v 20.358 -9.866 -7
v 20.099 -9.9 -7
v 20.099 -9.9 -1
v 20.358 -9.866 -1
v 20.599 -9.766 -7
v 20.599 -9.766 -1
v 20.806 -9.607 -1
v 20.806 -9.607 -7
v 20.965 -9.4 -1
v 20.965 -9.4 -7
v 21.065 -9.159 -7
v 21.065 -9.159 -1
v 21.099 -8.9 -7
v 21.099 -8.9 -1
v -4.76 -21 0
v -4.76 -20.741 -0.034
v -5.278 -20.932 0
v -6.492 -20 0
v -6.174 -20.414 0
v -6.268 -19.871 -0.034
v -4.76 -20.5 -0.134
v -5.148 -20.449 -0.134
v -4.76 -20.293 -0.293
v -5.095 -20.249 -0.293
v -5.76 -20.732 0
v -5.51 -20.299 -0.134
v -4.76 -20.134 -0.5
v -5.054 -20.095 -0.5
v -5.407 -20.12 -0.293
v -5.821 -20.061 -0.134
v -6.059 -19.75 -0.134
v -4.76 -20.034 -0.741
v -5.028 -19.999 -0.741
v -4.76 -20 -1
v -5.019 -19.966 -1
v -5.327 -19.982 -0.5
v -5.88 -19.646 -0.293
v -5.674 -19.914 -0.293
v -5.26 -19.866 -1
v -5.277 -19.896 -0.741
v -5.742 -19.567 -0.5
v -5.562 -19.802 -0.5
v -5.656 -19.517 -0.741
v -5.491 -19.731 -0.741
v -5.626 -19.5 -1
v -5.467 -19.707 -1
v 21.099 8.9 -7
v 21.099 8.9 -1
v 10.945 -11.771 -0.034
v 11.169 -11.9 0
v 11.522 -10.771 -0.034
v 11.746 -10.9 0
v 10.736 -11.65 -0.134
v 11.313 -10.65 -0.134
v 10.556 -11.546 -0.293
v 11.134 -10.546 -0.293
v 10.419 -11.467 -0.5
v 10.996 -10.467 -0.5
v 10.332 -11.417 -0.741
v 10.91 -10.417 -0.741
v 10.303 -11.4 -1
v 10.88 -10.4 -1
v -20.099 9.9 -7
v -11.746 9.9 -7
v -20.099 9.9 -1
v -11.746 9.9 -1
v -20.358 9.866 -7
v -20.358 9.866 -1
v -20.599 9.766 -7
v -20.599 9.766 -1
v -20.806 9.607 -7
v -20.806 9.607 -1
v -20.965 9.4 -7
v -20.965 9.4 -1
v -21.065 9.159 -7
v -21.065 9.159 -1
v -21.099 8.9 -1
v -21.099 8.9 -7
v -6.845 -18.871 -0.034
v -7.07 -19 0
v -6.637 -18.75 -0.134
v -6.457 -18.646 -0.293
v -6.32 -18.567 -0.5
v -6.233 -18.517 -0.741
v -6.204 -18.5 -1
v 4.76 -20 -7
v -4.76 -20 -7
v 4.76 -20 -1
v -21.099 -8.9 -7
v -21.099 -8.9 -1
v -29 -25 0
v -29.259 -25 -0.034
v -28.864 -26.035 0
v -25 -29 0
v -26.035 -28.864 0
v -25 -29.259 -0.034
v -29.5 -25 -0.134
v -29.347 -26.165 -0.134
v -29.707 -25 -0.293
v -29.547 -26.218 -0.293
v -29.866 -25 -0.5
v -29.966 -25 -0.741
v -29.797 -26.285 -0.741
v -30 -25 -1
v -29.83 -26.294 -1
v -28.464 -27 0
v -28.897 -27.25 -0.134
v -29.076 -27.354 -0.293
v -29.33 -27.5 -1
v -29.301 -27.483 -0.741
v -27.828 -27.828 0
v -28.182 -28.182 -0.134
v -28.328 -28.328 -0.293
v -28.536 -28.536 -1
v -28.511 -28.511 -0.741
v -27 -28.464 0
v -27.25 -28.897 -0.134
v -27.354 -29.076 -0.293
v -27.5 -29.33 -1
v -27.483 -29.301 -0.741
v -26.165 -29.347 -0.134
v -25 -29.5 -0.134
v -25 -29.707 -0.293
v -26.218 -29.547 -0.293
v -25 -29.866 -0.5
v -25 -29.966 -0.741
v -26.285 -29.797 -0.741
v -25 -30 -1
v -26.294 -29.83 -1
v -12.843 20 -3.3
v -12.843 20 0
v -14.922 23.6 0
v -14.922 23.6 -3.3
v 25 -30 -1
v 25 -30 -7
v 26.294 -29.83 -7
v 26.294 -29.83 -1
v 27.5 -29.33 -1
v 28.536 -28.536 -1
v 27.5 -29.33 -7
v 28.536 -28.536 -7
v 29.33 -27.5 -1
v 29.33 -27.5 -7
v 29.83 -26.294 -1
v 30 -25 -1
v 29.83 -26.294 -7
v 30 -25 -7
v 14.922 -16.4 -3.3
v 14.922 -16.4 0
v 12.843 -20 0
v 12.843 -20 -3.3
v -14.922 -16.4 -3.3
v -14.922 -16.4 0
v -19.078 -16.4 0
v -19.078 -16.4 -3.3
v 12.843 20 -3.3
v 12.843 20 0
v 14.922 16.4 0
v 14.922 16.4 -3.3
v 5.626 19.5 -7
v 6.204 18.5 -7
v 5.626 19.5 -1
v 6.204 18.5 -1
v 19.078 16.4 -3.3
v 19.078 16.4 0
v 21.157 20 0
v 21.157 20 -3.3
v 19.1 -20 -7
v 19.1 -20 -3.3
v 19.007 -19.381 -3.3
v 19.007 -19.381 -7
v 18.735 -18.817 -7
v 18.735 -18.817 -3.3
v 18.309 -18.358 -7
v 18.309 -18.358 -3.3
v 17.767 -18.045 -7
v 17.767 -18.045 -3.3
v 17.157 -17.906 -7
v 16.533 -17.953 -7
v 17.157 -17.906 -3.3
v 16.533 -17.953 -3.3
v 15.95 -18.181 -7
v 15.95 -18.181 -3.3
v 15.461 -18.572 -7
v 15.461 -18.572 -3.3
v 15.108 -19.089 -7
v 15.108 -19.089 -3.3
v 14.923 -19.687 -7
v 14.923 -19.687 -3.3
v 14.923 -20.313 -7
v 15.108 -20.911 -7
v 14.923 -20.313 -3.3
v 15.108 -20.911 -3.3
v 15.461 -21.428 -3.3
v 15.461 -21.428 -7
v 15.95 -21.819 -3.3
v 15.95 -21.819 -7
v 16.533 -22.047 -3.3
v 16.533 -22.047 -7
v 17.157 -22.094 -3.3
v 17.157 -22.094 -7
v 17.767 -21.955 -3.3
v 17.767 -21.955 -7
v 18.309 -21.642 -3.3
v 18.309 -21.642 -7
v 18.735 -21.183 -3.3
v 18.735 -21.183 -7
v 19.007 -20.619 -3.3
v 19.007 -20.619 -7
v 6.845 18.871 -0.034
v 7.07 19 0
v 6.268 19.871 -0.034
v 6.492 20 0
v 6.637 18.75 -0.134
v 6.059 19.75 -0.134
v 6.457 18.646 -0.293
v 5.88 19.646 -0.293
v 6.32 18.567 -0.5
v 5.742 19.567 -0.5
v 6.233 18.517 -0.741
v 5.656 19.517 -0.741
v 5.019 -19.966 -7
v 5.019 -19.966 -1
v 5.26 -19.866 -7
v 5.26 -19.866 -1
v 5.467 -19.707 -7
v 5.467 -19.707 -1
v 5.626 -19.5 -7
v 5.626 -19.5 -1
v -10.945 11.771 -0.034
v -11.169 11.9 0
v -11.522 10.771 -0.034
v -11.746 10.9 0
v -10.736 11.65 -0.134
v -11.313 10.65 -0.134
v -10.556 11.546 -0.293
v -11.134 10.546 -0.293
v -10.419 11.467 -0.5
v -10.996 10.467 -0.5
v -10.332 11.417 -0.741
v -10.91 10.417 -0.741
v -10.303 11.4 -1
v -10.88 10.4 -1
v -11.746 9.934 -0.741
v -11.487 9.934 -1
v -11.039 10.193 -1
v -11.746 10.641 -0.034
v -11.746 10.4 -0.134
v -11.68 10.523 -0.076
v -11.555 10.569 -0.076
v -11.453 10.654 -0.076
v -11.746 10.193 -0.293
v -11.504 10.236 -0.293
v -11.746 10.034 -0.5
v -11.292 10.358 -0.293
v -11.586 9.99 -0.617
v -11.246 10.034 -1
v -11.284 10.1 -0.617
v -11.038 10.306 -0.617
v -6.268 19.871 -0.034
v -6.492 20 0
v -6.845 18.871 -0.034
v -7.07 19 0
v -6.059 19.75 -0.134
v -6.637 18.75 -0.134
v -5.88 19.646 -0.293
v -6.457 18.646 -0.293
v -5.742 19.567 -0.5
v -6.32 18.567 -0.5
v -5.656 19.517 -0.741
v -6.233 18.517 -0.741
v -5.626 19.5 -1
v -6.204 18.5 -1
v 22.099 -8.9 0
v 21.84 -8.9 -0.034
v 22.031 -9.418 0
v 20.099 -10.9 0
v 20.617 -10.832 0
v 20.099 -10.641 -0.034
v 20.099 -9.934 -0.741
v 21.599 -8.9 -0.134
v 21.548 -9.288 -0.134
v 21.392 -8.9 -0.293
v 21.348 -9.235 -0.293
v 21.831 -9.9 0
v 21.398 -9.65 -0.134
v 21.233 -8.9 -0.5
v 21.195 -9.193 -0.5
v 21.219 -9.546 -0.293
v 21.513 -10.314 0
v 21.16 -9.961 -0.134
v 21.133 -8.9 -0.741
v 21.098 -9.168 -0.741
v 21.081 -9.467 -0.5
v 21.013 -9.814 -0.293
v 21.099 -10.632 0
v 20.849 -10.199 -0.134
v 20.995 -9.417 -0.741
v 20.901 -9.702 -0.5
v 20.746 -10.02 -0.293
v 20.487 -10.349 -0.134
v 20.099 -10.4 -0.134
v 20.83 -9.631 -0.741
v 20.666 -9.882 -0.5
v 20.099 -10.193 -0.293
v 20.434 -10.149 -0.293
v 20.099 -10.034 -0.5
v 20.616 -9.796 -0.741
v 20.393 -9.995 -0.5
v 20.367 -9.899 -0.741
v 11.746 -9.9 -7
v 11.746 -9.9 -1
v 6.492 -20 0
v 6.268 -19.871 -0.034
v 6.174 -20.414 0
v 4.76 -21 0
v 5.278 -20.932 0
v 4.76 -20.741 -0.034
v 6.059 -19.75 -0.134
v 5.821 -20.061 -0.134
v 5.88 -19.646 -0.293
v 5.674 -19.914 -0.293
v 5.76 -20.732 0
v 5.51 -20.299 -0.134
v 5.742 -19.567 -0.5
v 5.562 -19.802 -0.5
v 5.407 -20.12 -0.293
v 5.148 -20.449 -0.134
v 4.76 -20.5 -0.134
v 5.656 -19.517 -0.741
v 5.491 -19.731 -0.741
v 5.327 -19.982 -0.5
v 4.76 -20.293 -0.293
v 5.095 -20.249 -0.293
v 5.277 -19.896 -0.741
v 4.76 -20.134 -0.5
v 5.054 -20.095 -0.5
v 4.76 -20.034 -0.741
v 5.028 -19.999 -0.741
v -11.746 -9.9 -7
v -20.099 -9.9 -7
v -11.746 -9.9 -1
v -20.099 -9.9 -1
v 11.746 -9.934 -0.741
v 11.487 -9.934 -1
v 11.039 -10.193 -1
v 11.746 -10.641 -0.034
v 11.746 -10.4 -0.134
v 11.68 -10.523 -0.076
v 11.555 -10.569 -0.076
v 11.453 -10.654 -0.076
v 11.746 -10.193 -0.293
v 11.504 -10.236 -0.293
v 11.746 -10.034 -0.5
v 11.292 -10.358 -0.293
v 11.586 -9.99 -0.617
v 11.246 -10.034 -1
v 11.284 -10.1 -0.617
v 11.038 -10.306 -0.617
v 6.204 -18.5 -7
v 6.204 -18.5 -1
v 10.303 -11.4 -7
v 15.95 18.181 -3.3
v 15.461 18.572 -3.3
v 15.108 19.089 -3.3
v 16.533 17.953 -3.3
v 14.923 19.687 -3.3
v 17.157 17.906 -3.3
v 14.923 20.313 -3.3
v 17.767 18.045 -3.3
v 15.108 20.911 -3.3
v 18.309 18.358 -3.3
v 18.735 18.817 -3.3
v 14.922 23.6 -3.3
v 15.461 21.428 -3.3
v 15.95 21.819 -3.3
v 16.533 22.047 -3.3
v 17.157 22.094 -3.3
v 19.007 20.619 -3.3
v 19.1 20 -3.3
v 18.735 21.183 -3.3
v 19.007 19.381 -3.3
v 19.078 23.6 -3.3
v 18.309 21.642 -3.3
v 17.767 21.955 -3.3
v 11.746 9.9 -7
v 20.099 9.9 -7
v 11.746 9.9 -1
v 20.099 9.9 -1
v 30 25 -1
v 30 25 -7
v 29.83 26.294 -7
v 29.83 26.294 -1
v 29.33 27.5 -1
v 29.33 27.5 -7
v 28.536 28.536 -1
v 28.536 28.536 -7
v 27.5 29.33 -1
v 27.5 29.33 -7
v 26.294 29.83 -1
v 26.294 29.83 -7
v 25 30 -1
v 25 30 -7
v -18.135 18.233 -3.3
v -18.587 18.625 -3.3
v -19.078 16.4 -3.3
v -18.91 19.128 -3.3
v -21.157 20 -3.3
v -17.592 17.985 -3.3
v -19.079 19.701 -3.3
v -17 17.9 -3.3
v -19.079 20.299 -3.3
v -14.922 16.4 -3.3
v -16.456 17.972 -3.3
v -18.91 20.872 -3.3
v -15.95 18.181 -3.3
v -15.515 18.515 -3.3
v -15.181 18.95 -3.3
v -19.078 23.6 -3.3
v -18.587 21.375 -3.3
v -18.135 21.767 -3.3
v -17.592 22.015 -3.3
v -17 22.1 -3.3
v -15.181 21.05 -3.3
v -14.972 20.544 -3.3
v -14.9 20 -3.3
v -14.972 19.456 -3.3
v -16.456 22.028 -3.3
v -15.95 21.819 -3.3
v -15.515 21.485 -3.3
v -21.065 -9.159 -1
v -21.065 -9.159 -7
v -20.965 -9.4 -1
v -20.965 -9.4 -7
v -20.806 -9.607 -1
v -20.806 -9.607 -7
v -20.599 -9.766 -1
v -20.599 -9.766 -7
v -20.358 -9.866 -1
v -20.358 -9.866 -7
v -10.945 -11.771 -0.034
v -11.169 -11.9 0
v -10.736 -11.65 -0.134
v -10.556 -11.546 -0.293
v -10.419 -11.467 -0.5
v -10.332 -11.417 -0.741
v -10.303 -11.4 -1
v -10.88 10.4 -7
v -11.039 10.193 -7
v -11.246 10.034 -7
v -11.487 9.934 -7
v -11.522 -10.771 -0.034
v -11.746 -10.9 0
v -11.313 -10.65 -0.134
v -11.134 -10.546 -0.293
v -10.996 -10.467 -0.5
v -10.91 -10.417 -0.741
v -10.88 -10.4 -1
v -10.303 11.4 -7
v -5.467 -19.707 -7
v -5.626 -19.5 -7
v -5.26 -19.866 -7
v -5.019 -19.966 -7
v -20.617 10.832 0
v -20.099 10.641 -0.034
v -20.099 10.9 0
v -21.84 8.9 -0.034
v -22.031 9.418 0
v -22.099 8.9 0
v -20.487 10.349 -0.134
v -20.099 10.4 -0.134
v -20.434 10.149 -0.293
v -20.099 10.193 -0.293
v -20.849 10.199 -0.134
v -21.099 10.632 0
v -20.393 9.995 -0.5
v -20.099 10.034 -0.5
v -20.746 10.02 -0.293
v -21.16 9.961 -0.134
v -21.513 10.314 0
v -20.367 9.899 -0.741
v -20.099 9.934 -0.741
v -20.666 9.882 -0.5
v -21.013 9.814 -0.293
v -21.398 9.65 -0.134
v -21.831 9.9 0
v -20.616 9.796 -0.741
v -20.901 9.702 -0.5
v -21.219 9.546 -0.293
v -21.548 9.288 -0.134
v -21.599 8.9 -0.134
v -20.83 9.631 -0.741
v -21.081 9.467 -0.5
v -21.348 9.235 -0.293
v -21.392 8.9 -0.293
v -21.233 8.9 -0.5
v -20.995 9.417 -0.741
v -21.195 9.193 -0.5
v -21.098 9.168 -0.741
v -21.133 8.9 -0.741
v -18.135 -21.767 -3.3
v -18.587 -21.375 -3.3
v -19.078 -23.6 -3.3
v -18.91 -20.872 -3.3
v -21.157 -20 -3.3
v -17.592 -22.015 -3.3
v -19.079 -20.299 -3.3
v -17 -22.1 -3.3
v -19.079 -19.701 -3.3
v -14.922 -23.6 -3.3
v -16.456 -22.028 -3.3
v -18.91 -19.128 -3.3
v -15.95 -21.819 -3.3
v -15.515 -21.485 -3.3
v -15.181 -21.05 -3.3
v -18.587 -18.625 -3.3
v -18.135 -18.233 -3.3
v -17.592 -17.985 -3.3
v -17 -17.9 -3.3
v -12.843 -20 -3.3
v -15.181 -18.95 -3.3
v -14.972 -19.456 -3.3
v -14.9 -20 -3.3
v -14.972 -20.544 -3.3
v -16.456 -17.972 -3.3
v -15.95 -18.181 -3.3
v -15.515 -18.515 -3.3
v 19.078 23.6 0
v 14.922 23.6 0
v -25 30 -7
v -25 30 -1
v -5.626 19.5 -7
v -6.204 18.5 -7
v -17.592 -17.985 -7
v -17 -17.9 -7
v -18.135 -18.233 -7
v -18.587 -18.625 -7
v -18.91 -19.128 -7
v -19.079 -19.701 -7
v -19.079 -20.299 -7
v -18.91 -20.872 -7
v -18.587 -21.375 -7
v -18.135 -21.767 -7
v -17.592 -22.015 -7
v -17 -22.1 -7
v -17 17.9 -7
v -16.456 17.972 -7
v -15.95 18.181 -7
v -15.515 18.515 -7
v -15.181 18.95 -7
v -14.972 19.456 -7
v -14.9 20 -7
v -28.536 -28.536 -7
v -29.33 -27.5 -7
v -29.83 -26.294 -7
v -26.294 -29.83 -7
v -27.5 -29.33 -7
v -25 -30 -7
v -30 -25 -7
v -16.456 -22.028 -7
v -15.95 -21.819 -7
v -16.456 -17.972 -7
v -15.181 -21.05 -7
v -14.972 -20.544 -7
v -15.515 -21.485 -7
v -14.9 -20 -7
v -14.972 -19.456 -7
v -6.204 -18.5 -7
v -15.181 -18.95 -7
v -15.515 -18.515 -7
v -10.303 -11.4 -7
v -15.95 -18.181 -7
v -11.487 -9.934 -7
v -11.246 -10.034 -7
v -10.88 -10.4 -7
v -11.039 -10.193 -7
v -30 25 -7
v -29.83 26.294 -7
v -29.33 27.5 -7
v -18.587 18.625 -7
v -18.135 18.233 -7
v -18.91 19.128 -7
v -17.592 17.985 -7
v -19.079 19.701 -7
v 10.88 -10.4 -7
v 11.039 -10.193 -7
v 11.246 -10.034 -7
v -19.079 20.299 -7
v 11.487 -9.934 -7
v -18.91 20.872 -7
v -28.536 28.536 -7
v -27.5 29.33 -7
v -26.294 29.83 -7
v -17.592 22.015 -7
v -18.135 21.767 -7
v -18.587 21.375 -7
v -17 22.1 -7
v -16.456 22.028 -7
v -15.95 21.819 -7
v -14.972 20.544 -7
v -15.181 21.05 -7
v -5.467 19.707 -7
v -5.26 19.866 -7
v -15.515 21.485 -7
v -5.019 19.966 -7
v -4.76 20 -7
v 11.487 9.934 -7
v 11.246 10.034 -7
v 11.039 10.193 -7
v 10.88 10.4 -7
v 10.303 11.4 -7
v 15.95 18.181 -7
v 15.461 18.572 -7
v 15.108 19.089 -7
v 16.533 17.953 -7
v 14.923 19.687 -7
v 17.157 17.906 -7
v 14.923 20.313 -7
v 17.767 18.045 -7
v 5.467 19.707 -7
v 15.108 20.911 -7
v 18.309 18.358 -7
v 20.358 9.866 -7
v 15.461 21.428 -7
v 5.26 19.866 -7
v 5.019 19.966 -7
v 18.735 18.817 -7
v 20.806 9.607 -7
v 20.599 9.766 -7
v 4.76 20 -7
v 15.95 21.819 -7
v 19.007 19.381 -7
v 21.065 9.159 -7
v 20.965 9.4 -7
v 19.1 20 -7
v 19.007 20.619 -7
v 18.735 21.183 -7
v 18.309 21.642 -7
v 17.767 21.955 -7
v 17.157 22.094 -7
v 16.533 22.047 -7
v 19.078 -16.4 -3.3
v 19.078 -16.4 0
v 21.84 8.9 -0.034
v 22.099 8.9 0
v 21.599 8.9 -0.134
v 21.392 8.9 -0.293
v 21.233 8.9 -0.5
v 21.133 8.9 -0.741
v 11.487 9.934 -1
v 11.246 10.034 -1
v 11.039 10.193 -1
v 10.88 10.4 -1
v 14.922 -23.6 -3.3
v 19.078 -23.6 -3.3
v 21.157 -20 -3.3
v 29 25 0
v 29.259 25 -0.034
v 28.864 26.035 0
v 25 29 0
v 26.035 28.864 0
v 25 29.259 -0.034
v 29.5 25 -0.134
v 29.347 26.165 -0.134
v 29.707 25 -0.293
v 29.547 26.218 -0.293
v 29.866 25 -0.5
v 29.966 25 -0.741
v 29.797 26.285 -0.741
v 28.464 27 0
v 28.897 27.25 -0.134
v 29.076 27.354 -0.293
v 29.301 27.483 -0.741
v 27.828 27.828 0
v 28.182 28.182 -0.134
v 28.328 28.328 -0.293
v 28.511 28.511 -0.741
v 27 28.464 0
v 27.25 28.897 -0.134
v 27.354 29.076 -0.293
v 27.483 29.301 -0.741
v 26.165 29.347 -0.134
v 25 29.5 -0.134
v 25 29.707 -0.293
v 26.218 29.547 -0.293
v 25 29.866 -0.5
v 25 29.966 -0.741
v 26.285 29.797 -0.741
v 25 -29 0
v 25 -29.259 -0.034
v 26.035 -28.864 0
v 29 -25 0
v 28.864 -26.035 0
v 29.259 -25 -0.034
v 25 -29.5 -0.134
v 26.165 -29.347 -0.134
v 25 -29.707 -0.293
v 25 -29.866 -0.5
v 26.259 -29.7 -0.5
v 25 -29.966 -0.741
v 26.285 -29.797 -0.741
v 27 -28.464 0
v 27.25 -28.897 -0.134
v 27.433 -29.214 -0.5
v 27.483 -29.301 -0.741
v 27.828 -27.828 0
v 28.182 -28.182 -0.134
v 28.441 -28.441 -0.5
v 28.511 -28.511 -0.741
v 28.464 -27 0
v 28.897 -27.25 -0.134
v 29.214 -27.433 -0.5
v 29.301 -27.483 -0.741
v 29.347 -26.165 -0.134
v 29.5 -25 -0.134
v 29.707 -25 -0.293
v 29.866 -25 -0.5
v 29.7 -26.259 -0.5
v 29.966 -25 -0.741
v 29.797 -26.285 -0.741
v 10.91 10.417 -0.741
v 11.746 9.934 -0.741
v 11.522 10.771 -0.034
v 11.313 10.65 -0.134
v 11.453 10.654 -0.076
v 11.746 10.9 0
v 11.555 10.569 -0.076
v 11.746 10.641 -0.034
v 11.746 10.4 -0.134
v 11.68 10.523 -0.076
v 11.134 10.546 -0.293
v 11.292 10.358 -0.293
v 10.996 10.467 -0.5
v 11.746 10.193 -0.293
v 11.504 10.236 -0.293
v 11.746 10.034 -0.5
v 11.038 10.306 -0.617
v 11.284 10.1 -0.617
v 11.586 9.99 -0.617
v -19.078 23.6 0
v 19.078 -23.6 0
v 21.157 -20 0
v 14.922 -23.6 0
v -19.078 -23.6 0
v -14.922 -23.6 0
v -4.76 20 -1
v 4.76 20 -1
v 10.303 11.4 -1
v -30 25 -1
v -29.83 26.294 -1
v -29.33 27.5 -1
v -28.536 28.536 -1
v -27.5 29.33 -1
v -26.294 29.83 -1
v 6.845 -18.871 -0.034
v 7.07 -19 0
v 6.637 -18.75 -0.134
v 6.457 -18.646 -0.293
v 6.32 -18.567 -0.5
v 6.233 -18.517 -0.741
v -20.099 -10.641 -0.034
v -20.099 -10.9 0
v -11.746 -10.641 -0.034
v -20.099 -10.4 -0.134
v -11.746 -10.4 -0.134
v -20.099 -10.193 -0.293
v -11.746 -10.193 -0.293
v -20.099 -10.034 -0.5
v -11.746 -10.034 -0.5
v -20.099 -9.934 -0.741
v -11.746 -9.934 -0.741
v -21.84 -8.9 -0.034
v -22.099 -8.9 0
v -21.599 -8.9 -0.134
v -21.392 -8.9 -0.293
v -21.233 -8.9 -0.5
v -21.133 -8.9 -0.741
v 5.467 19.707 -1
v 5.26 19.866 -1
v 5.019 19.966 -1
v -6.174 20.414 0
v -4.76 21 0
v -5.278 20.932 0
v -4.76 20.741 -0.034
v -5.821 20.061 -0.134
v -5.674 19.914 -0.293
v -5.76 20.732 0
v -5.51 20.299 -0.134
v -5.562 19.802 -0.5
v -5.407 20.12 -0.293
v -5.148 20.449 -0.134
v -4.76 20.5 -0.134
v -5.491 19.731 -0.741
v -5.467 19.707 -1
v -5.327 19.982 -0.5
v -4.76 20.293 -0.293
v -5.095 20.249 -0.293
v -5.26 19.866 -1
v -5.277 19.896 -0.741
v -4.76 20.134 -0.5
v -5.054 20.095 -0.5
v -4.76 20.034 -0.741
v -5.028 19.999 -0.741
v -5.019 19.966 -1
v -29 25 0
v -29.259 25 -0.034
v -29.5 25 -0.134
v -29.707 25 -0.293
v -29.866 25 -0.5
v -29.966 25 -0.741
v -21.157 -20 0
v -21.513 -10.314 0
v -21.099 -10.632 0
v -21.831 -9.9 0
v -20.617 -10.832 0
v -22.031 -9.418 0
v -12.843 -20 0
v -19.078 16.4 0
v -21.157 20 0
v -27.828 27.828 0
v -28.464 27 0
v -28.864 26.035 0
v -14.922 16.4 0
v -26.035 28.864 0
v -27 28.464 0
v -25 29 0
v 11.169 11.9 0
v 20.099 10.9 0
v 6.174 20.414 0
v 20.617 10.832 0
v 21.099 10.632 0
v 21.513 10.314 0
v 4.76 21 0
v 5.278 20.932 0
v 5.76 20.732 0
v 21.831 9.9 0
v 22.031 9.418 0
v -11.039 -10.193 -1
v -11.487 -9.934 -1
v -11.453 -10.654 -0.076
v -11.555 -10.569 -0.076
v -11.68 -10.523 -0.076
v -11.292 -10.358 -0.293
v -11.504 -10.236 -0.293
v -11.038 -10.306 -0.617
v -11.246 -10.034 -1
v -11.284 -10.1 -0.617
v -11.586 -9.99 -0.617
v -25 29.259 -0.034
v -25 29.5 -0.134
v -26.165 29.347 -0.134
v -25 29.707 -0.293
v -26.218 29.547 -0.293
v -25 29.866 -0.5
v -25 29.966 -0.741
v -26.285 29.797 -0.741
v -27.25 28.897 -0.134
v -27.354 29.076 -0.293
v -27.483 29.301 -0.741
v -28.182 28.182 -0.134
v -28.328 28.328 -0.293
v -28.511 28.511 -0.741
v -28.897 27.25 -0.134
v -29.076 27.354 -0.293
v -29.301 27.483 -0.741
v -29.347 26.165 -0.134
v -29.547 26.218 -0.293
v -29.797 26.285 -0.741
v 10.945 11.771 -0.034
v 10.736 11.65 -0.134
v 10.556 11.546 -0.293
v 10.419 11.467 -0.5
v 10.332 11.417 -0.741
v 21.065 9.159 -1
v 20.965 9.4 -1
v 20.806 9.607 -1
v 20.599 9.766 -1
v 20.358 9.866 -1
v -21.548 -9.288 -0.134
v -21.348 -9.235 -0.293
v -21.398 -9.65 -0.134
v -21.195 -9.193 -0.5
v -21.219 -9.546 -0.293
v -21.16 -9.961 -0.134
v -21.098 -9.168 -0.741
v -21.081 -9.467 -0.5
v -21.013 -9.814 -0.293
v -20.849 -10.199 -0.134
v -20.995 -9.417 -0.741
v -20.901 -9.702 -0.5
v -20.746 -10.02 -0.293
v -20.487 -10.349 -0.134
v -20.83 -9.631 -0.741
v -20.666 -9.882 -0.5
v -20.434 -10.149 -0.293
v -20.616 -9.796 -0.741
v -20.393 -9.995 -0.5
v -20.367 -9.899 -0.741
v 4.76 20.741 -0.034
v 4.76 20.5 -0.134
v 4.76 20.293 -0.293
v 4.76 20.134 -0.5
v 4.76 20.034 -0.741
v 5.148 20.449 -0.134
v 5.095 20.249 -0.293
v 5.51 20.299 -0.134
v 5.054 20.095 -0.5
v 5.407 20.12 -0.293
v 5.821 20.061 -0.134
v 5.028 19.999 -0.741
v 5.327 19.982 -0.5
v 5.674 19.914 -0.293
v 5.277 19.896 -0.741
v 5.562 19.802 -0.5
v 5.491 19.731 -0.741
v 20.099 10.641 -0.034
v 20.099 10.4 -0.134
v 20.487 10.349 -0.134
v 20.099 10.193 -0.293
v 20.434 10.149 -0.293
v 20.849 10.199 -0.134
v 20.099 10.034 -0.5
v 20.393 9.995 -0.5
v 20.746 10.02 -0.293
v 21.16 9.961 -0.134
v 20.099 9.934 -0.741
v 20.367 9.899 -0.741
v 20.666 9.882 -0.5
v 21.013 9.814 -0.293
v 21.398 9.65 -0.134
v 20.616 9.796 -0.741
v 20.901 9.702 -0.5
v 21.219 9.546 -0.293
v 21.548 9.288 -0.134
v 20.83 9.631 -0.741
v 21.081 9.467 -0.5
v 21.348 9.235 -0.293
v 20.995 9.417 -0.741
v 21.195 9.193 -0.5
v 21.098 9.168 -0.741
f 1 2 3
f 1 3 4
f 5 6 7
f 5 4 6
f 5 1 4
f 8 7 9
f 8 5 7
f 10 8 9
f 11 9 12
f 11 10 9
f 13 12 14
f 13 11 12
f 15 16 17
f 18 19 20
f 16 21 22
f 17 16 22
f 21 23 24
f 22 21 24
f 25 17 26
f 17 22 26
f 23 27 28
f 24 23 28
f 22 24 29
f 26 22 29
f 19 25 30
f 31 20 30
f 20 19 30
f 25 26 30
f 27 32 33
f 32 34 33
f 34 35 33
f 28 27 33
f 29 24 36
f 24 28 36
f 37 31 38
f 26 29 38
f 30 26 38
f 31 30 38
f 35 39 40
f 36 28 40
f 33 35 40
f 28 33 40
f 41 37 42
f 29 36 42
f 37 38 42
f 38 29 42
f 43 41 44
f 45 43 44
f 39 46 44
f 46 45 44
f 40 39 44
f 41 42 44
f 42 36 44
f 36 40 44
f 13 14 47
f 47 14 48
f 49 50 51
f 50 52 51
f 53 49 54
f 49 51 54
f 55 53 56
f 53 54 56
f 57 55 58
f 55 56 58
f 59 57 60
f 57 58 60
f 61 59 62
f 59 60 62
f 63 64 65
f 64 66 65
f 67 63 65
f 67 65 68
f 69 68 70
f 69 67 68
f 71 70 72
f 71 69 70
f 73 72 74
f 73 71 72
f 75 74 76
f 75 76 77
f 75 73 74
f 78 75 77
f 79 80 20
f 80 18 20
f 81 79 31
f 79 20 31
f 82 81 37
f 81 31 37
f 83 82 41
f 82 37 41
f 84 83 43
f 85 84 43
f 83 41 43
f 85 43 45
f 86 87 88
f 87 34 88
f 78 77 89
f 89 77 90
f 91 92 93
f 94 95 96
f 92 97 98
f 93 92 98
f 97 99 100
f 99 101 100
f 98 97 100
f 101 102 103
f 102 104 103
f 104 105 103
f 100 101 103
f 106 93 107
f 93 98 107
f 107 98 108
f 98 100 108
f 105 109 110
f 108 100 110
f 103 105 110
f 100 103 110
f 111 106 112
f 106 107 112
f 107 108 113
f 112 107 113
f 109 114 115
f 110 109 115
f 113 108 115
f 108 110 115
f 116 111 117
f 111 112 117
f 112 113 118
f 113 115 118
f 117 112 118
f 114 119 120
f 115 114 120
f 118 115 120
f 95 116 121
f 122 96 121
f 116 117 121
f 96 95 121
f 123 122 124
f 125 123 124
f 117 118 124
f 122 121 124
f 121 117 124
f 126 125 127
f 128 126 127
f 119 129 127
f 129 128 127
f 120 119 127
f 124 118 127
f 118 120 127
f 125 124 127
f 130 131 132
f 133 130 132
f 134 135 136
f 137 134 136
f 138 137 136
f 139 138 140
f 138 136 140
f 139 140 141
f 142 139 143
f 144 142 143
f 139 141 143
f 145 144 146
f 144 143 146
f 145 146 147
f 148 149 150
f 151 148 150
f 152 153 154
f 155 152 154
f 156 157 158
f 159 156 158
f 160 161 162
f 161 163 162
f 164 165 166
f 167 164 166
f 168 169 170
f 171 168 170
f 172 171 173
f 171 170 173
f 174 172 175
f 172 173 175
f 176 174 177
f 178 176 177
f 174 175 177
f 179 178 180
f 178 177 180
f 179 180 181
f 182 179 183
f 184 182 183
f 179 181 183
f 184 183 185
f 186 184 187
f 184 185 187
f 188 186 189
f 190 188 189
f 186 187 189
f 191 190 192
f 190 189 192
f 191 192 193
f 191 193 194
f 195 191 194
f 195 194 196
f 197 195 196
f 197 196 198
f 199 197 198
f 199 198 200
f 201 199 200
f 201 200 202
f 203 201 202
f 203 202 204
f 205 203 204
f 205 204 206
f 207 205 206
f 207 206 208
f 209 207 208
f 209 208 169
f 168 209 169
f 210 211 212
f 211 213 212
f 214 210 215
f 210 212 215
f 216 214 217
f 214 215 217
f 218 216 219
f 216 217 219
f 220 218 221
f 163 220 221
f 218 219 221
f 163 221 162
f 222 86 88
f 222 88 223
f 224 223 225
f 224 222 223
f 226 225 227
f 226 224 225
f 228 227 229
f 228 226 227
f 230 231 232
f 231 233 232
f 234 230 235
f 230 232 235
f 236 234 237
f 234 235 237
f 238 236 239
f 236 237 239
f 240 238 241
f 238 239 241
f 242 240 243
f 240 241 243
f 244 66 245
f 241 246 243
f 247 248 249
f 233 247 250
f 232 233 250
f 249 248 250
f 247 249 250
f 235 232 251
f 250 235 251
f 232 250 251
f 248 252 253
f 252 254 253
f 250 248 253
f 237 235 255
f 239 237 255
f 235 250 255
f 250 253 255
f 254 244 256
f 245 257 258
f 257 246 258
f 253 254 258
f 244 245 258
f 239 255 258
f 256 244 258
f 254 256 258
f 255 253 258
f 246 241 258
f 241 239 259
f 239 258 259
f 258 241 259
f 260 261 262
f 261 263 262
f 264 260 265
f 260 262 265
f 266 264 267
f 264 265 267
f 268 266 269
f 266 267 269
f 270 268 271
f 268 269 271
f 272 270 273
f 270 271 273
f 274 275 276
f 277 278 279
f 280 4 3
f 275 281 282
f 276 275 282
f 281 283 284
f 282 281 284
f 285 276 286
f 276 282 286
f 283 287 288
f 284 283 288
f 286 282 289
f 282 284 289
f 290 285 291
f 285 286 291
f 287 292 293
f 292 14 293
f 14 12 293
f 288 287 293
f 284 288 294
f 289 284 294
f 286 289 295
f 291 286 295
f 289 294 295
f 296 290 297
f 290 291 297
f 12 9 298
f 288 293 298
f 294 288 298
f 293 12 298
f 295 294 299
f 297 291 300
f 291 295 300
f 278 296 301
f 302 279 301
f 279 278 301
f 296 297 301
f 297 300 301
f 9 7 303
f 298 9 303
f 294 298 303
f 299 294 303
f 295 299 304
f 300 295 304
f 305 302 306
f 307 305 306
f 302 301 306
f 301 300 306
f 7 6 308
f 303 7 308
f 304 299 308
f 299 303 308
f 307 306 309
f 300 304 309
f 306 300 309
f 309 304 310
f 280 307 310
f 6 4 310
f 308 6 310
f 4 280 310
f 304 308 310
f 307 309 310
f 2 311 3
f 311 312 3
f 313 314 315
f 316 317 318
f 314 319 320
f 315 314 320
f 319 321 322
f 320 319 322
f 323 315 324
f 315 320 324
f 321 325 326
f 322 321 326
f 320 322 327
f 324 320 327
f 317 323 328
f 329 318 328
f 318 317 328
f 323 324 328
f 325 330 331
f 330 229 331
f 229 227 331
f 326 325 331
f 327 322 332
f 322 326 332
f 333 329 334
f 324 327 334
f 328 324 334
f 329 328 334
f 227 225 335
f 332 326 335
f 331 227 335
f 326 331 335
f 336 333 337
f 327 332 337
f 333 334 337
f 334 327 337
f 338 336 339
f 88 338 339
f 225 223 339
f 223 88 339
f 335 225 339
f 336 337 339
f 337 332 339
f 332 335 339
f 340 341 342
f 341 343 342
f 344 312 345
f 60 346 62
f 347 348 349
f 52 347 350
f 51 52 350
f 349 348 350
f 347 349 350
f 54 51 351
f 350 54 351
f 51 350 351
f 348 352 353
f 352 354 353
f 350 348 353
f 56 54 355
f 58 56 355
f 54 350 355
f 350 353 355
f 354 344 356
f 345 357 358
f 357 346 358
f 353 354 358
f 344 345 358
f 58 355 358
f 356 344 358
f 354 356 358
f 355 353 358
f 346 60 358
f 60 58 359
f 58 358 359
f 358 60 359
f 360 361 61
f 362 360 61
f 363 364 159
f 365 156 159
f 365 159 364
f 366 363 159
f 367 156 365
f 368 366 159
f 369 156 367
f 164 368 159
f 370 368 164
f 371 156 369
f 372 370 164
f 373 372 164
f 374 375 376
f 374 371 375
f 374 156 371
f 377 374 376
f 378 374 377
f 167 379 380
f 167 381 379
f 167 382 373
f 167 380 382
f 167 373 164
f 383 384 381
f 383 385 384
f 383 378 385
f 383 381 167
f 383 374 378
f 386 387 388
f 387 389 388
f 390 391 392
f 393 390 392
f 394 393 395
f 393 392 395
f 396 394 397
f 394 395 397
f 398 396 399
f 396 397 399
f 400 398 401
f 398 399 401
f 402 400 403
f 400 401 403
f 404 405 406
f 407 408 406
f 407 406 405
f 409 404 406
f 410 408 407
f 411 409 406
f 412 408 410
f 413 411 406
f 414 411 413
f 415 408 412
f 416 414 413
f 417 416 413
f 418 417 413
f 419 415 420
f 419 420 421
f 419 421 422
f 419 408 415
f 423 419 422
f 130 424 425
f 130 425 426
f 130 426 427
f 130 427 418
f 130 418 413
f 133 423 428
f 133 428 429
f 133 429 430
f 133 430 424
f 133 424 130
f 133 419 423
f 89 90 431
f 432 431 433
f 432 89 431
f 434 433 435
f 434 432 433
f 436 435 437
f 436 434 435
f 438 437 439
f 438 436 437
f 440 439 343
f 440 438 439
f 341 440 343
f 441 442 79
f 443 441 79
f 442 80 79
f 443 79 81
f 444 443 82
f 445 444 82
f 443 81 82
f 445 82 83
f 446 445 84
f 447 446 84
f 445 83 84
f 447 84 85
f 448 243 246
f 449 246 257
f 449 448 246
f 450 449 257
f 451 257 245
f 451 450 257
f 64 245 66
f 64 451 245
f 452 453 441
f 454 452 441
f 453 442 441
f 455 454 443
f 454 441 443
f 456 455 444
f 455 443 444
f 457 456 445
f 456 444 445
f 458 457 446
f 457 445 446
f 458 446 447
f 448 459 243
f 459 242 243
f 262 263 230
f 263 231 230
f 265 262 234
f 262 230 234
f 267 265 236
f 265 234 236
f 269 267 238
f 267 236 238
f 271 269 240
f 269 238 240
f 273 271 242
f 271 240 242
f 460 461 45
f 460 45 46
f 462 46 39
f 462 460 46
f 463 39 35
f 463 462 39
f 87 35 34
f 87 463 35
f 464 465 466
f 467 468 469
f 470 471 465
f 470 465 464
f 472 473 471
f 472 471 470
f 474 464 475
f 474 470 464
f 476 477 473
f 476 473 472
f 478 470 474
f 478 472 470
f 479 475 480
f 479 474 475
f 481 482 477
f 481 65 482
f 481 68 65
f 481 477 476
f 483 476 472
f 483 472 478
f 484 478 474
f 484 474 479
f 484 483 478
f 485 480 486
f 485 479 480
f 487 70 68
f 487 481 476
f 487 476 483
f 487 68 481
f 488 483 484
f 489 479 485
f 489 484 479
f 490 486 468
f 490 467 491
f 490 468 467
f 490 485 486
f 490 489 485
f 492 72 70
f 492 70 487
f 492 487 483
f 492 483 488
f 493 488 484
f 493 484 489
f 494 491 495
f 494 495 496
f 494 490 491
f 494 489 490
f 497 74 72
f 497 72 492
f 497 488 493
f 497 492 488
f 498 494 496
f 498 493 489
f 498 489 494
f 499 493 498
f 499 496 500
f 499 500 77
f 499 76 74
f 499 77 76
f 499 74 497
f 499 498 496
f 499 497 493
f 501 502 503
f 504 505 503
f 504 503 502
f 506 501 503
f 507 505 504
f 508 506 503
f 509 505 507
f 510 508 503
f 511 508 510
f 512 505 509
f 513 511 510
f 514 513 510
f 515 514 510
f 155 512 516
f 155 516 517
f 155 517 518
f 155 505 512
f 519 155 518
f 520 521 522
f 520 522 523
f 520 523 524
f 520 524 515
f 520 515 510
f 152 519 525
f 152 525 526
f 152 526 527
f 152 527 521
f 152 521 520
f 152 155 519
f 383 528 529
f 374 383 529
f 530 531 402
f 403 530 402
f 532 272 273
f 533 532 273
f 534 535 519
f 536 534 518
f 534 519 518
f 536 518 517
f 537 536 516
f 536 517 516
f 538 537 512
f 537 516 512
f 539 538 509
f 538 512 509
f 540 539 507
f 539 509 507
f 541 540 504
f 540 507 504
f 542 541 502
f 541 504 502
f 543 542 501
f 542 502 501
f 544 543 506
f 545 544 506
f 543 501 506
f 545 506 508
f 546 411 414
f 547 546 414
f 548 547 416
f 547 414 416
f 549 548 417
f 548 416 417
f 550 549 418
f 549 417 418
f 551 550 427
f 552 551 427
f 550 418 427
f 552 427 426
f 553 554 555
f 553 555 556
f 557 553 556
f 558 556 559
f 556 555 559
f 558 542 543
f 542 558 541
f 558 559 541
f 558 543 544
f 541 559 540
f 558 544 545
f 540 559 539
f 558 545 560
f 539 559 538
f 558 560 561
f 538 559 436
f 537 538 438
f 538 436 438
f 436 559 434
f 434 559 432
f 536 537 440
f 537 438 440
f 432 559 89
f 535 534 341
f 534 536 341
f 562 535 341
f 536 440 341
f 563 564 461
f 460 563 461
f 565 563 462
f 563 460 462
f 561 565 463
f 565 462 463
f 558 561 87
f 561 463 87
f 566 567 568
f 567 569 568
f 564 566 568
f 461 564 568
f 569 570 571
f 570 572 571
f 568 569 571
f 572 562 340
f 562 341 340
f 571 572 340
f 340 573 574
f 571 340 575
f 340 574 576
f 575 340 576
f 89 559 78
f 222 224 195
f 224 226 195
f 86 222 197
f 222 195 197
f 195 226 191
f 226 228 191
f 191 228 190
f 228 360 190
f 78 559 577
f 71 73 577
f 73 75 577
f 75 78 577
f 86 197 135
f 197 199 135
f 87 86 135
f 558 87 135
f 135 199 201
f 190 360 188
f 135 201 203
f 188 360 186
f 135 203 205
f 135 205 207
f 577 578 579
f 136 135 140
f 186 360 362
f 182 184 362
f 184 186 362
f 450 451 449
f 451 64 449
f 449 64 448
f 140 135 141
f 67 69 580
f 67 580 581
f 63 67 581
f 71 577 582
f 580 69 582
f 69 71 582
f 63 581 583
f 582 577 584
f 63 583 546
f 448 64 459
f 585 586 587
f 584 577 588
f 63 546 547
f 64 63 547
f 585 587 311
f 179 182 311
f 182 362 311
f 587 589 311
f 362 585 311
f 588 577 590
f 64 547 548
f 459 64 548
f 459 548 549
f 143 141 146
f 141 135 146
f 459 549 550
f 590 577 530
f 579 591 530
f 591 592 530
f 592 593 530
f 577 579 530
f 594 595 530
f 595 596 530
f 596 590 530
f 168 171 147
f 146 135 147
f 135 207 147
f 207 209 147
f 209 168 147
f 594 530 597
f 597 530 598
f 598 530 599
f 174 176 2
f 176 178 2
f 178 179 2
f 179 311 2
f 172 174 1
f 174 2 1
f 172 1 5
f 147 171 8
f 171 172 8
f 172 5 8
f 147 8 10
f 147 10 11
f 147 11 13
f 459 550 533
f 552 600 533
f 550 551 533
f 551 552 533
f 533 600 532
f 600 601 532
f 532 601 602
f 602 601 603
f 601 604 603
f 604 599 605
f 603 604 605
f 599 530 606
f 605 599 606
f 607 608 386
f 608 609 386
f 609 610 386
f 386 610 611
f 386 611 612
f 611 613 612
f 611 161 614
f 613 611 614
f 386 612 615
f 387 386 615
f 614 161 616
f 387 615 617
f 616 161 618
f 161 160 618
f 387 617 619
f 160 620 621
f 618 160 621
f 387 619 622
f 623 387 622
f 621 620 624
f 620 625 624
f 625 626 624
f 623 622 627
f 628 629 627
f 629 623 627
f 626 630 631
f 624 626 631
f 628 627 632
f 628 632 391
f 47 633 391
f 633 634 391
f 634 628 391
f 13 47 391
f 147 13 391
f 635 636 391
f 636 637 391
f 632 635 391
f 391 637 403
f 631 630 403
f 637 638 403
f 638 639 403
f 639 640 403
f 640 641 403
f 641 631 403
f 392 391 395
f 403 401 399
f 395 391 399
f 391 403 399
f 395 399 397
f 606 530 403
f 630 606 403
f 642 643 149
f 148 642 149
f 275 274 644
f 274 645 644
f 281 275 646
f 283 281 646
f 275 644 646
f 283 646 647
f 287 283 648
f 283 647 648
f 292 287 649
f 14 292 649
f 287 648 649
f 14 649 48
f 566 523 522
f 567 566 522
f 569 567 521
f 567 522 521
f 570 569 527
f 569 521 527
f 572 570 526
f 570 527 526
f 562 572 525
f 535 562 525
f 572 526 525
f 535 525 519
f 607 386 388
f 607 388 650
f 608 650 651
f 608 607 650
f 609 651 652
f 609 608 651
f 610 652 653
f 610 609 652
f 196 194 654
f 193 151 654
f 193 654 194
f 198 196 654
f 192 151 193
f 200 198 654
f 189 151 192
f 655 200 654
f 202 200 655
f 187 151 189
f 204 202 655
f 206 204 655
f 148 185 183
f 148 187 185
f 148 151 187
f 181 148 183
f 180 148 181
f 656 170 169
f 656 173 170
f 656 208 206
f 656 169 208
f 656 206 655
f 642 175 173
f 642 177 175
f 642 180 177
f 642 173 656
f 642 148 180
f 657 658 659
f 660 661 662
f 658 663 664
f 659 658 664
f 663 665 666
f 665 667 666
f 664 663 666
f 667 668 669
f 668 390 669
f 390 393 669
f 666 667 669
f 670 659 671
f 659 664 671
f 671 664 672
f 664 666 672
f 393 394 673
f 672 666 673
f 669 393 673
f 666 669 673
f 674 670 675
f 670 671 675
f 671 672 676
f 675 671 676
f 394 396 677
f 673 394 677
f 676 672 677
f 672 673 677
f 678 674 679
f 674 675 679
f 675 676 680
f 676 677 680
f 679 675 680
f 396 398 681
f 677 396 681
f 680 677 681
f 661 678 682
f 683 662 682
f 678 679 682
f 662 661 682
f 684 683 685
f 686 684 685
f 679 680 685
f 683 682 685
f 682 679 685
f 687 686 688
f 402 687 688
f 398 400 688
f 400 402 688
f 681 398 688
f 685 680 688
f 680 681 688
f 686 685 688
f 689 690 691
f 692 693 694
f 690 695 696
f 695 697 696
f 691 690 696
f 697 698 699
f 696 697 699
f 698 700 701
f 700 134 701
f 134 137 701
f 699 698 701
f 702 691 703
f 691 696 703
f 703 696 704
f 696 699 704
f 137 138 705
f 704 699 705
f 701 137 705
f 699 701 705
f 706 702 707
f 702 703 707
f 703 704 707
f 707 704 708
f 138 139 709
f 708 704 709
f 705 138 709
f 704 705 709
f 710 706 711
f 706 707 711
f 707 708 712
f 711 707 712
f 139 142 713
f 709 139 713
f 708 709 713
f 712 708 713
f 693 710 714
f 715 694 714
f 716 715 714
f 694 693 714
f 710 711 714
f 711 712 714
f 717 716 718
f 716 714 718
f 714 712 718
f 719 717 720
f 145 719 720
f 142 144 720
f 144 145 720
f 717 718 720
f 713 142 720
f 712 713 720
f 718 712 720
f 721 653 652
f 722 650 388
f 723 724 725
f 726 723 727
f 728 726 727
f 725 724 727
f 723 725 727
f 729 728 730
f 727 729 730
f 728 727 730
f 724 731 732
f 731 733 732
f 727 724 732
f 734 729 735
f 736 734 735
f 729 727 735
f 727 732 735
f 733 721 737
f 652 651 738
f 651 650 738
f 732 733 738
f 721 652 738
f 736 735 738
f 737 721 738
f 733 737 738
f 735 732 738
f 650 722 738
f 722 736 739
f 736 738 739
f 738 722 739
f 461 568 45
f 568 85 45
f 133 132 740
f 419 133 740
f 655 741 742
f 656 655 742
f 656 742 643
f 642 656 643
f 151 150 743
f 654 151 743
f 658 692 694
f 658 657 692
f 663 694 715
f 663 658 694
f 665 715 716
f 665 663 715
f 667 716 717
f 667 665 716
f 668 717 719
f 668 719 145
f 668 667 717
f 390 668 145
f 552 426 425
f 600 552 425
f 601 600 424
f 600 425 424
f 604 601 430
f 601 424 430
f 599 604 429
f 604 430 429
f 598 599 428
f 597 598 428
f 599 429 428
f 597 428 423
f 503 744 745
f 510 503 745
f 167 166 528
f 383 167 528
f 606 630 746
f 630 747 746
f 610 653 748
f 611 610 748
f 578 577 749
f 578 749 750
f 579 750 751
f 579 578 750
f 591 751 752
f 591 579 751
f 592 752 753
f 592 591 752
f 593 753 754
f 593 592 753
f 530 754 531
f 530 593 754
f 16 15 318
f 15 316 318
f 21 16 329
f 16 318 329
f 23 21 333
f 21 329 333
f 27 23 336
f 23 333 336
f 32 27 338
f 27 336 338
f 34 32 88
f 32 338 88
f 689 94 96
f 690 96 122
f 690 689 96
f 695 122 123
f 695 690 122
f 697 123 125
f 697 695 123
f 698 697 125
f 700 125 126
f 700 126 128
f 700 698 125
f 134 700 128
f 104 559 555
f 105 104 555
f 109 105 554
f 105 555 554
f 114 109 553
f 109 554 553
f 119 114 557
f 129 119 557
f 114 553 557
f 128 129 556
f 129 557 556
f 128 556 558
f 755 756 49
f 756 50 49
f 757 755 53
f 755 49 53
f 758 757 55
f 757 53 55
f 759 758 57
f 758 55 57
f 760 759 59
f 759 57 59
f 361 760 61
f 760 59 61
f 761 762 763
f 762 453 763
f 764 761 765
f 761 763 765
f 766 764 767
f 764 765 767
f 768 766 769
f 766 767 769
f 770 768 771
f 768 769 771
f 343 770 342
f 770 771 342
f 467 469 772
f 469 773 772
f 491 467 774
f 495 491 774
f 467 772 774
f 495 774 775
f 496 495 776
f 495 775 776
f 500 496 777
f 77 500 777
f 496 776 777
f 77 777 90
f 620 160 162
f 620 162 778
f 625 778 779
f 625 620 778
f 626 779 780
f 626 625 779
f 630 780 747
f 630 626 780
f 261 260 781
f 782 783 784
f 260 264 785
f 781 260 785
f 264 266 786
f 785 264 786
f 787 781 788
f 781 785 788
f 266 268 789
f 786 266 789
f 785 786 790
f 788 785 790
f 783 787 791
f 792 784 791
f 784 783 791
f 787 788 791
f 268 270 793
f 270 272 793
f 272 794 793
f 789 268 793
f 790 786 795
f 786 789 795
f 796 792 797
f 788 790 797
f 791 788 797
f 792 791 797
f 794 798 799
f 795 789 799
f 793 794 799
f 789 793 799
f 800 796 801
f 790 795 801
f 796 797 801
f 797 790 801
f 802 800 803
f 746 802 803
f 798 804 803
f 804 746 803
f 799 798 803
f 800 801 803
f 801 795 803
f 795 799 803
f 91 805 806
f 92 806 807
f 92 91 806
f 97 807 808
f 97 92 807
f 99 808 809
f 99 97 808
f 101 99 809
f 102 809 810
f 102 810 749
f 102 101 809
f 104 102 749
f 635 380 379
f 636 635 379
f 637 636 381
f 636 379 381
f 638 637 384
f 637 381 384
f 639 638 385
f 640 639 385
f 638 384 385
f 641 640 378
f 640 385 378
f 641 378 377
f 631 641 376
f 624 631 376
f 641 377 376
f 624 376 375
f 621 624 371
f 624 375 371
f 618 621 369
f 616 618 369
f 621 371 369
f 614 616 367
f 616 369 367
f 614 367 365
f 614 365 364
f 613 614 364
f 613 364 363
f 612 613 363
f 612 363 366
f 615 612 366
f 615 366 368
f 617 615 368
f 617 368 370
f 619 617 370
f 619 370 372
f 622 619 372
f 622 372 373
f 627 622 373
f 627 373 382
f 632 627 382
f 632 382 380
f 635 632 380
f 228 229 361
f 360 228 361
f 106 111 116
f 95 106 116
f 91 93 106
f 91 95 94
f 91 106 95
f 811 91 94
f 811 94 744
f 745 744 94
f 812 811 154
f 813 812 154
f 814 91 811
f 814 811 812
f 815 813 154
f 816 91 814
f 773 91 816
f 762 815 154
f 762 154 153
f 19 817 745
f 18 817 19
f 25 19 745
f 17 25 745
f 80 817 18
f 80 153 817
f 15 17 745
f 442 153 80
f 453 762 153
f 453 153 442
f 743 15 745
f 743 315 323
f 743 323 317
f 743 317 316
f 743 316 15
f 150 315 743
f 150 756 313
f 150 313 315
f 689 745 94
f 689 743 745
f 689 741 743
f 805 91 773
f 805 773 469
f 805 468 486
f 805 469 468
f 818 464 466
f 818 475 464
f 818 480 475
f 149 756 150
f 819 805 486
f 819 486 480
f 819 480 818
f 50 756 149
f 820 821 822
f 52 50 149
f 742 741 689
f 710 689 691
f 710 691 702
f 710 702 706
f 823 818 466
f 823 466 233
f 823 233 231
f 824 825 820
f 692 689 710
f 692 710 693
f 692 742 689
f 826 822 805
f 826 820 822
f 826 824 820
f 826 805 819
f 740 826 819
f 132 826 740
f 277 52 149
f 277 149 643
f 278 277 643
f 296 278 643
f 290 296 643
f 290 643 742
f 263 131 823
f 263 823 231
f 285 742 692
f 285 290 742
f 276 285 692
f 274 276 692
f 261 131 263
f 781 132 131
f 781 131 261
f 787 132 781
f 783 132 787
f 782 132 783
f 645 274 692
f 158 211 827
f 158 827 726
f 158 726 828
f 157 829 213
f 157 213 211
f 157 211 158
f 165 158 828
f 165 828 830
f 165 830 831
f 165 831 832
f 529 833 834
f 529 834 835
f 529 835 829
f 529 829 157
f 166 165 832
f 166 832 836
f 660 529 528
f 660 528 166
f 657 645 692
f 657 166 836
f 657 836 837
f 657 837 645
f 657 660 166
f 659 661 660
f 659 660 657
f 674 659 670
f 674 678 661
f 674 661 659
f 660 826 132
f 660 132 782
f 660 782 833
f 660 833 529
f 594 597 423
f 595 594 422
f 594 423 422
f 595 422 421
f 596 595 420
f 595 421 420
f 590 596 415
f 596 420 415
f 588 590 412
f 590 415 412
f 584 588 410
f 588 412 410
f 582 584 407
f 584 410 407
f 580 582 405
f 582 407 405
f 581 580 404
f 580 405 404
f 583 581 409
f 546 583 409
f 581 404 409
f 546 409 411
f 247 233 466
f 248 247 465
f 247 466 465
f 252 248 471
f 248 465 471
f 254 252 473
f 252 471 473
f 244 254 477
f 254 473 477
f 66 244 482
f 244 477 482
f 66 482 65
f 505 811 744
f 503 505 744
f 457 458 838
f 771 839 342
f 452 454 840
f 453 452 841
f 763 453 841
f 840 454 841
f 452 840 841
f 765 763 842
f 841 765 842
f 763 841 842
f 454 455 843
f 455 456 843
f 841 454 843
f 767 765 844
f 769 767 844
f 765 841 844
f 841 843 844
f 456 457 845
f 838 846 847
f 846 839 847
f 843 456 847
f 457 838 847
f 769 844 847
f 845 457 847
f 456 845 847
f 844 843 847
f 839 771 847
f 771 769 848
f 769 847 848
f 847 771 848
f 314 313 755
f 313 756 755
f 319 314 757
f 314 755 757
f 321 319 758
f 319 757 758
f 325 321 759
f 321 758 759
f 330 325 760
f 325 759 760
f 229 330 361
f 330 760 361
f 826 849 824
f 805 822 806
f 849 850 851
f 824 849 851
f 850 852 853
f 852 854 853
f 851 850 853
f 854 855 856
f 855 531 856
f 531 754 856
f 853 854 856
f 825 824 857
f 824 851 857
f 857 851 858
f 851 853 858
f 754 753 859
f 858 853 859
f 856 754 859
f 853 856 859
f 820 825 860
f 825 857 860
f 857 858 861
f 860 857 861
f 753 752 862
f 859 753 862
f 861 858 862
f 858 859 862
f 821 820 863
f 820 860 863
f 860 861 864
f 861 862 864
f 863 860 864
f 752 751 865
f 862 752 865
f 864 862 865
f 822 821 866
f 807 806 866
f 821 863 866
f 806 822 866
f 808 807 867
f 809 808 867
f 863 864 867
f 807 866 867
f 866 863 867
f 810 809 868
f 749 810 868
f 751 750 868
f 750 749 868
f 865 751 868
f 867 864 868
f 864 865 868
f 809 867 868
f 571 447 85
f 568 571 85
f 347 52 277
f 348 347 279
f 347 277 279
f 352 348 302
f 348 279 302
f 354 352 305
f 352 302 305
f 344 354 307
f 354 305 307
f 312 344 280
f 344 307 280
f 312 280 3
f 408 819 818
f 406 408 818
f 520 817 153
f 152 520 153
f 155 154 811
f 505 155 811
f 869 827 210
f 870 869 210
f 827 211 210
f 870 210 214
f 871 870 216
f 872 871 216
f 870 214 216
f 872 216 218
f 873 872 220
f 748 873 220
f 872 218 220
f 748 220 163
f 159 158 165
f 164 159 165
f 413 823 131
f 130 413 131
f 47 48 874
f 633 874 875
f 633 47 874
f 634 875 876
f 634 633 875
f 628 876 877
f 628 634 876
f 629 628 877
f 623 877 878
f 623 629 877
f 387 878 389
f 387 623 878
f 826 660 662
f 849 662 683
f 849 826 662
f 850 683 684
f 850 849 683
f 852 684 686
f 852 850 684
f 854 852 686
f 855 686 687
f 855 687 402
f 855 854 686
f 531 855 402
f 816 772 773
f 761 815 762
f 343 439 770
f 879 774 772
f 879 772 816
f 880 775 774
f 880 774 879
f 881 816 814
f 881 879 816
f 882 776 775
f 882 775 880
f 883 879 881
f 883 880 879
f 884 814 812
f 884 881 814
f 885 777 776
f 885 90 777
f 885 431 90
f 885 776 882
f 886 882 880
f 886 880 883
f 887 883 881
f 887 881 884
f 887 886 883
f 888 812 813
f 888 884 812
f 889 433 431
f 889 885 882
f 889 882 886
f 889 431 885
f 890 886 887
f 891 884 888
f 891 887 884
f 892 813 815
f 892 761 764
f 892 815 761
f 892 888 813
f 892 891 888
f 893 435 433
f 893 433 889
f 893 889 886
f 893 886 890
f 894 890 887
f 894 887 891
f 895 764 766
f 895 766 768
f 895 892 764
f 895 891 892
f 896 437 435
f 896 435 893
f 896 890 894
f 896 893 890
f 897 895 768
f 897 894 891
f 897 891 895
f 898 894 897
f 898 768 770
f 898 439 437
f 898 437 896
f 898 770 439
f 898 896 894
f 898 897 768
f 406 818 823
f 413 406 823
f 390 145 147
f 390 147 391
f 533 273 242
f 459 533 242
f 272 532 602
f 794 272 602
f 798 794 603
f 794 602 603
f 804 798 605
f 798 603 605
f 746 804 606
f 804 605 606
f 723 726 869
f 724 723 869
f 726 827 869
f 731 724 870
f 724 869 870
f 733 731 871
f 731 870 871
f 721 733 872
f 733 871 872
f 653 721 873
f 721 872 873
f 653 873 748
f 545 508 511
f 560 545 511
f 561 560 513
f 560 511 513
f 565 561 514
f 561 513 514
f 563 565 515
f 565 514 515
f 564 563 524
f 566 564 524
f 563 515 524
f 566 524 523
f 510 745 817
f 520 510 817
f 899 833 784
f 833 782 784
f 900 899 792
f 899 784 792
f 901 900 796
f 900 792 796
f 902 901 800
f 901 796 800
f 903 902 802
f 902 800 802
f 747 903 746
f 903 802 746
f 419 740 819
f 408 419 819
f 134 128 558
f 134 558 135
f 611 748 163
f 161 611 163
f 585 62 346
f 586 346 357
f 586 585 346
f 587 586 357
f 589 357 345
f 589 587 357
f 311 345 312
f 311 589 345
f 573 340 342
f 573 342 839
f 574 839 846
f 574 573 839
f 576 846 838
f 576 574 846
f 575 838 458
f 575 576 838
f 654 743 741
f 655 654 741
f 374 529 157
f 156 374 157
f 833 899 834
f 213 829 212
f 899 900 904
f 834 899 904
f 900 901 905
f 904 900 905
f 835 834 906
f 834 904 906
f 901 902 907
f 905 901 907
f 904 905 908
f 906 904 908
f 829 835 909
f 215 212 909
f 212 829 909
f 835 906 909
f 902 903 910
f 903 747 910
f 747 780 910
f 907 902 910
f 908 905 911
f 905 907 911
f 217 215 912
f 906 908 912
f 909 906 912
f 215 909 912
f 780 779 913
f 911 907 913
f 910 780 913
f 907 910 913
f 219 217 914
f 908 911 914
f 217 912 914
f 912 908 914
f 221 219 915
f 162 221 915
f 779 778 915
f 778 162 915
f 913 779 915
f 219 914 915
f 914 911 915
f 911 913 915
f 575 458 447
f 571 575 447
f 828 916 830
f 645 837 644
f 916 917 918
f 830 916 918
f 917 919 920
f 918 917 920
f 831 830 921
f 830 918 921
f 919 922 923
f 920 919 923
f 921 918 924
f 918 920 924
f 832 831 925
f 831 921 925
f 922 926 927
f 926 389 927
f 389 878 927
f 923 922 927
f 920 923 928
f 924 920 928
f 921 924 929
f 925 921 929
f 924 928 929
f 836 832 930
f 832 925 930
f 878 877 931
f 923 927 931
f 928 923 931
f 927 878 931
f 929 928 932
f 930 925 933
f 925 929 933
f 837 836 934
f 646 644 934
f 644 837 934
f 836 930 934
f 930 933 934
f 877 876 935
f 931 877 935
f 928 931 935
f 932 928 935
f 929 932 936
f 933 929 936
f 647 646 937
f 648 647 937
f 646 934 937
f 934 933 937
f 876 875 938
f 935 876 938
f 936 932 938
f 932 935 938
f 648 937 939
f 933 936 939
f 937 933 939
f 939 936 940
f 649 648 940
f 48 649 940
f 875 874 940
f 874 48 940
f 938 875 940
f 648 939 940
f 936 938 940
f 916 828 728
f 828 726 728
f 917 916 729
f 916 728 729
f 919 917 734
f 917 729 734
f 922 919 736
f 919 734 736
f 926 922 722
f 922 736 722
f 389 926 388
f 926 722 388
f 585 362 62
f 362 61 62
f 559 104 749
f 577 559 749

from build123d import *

# Parameters (mm, degrees)
F0_W     = 60
F0_H     = 60
F1_DEPTH = 7
F2_R     = 5
F3_R     = 2.1
F4_DEPTH = 25
F5_DEPTH = 3.3
F6_R     = 1
F7_DEPTH = 25
F8_R     = 1


# Not quite as in the source:
# - a feature names something its author has since deleted; it is built from what else it names


with BuildPart() as f1:
    # F0 (on Top) → F1 (new body)
    with BuildSketch(Plane.XY):
        Rectangle(F0_W, F0_H)
    extrude(amount=-F1_DEPTH)

    # F2
    f2_edges = [f1.edges().sort_by_distance(p)[0] for p in [
        (-30, 30, -3.5),
        (30, 30, -3.5),
        (30, -30, -3.5),
        (-30, -30, -3.5),
    ]]
    fillet(f2_edges, radius=F2_R)

    # F3 (on face) → F4 (cut)
    with BuildSketch(Plane.XY):
        with BuildLine():
            Line((-17, 17.9), (-17, 22.1))
            ThreePointArc((-17, 22.1), (-19.1, 20), (-17, 17.9))
        make_face()
        with BuildLine():
            ThreePointArc((-17, 17.9), (-15.5150757595, 18.5150757595), (-14.9, 20))
            ThreePointArc((-14.9, 20), (-15.5150757595, 21.4849242405), (-17, 22.1))
            Line((-17, 22.1), (-17, 17.9))
        make_face()
        with Locations((17, 20)):
            Circle(F3_R)
        with Locations((17, -20)):
            Circle(F3_R)
        with BuildLine():
            Line((-17, -22.1), (-17, -17.9))
            ThreePointArc((-17, -17.9), (-19.1, -20), (-17, -22.1))
        make_face()
        with BuildLine():
            ThreePointArc((-17, -22.1), (-15.5150757595, -21.4849242405), (-14.9, -20))
            ThreePointArc((-14.9, -20), (-15.5150757595, -18.5150757595), (-17, -17.9))
            Line((-17, -17.9), (-17, -22.1))
        make_face()
    extrude(amount=-F4_DEPTH, mode=Mode.SUBTRACT)

    # F3 (on face) → F5 (cut)
    with BuildSketch(Plane.XY):
        with BuildLine():
            ThreePointArc((-17, 17.9), (-19.1, 20), (-17, 22.1))
            Line((-17, 22.1), (-17, 23.6))
            Line((-17, 23.6), (-19.0784609691, 23.6))
            Line((-19.0784609691, 23.6), (-21.1569219382, 20))
            Line((-21.1569219382, 20), (-19.0784609691, 16.4))
            Line((-19.0784609691, 16.4), (-17, 16.4))
            Line((-17, 16.4), (-17, 17.9))
        make_face()
        with BuildLine():
            ThreePointArc((-17, 22.1), (-15.5150757595, 21.4849242405), (-14.9, 20))
            ThreePointArc((-14.9, 20), (-15.5150757595, 18.5150757595), (-17, 17.9))
            Line((-17, 17.9), (-17, 16.4))
            Line((-17, 16.4), (-14.9215390309, 16.4))
            Line((-14.9215390309, 16.4), (-12.8430780618, 20))
            Line((-12.8430780618, 20), (-14.9215390309, 23.6))
            Line((-14.9215390309, 23.6), (-17, 23.6))
            Line((-17, 23.6), (-17, 22.1))
        make_face()
        Polygon((19.0784609691, 23.6), (14.9215390309, 23.6), (12.8430780618, 20), (14.9215390309, 16.4), (19.0784609691, 16.4), (21.1569219382, 20), align=None)
        with Locations((17, 20)):
            Circle(F3_R, mode=Mode.SUBTRACT)
        with BuildLine():
            ThreePointArc((-17, -22.1), (-19.1, -20), (-17, -17.9))
            Line((-17, -17.9), (-17, -16.4))
            Line((-17, -16.4), (-19.0784609691, -16.4))
            Line((-19.0784609691, -16.4), (-21.1569219382, -20))
            Line((-21.1569219382, -20), (-19.0784609691, -23.6))
            Line((-19.0784609691, -23.6), (-17, -23.6))
            Line((-17, -23.6), (-17, -22.1))
        make_face()
        with BuildLine():
            ThreePointArc((-17, -17.9), (-15.5150757595, -18.5150757595), (-14.9, -20))
            ThreePointArc((-14.9, -20), (-15.5150757595, -21.4849242405), (-17, -22.1))
            Line((-17, -22.1), (-17, -23.6))
            Line((-17, -23.6), (-14.9215390309, -23.6))
            Line((-14.9215390309, -23.6), (-12.8430780618, -20))
            Line((-12.8430780618, -20), (-14.9215390309, -16.4))
            Line((-14.9215390309, -16.4), (-17, -16.4))
            Line((-17, -16.4), (-17, -17.9))
        make_face()
        Polygon((19.0784609691, -23.6), (21.1569219382, -20), (19.0784609691, -16.4), (14.9215390309, -16.4), (12.8430780618, -20), (14.9215390309, -23.6), align=None)
        with Locations((17, -20)):
            Circle(F3_R, mode=Mode.SUBTRACT)
    extrude(amount=-F5_DEPTH, mode=Mode.SUBTRACT)

    # F6
    f6_edges = [f1.edges().sort_by_distance(p)[0] for p in [
        (30, 0, 0),
        (0, 30, 0),
        (-30, 0, 0),
        (0, -30, 0),
        (-28.535534, -28.535534, 0),
        (28.535534, -28.535534, 0),
        (28.535534, 28.535534, 0),
        (-28.535534, 28.535534, 0),
    ]]
    fillet(f6_edges, radius=F6_R)

    # F3 (on face) → F7 (cut)
    with BuildSketch(Plane.XY):
        Polygon((-5.3375245624, 20), (-6.2035499662, 18.5), (-10.3027368774, 11.4), (-11.1687622812, 9.9), (-12.9008130888, 9.9), (-21.0991869112, 9.9), (-21.0991869112, -9.9), (-12.9008130888, -9.9), (-11.1687622812, -9.9), (-10.3027368774, -11.4), (-6.2035499662, -18.5), (-5.3375245624, -20), (5.3375245624, -20), (6.2035499662, -18.5), (10.3027368774, -11.4), (11.1687622812, -9.9), (12.9008130888, -9.9), (21.0991869112, -9.9), (21.0991869112, 9.9), (12.9008130888, 9.9), (11.1687622812, 9.9), (10.3027368774, 11.4), (6.2035499662, 18.5), (5.3375245624, 20), (0, 20), align=None)
    extrude(amount=-F7_DEPTH, mode=Mode.SUBTRACT)

    # F8
    f8_edges = [f1.edges().sort_by_distance(p)[0] for p in [
        (-16.133975, 9.9, 0),
        (-21.099187, 0, 0),
        (-8.253143, 14.95, 0),
        (0, 20, 0),
        (8.253143, 14.95, 0),
        (16.133975, 9.9, 0),
        (21.099187, 0, 0),
        (16.133975, -9.9, 0),
        (8.253143, -14.95, 0),
        (0, -20, 0),
        (-8.253143, -14.95, 0),
        (-16.133975, -9.9, 0),
        (-11.168762, 9.9, -3.5),
        (-5.337525, 20, -3.5),
        (5.337525, 20, -3.5),
        (11.168762, 9.9, -3.5),
        (21.099187, 9.9, -3.5),
        (21.099187, -9.9, -3.5),
        (11.168762, -9.9, -3.5),
        (5.337525, -20, -3.5),
        (-5.337525, -20, -3.5),
        (-11.168762, -9.9, -3.5),
        (-21.099187, -9.9, -3.5),
        (-21.099187, 9.9, -3.5),
    ]]
    fillet(f8_edges, radius=F8_R)


solid = f1.part
